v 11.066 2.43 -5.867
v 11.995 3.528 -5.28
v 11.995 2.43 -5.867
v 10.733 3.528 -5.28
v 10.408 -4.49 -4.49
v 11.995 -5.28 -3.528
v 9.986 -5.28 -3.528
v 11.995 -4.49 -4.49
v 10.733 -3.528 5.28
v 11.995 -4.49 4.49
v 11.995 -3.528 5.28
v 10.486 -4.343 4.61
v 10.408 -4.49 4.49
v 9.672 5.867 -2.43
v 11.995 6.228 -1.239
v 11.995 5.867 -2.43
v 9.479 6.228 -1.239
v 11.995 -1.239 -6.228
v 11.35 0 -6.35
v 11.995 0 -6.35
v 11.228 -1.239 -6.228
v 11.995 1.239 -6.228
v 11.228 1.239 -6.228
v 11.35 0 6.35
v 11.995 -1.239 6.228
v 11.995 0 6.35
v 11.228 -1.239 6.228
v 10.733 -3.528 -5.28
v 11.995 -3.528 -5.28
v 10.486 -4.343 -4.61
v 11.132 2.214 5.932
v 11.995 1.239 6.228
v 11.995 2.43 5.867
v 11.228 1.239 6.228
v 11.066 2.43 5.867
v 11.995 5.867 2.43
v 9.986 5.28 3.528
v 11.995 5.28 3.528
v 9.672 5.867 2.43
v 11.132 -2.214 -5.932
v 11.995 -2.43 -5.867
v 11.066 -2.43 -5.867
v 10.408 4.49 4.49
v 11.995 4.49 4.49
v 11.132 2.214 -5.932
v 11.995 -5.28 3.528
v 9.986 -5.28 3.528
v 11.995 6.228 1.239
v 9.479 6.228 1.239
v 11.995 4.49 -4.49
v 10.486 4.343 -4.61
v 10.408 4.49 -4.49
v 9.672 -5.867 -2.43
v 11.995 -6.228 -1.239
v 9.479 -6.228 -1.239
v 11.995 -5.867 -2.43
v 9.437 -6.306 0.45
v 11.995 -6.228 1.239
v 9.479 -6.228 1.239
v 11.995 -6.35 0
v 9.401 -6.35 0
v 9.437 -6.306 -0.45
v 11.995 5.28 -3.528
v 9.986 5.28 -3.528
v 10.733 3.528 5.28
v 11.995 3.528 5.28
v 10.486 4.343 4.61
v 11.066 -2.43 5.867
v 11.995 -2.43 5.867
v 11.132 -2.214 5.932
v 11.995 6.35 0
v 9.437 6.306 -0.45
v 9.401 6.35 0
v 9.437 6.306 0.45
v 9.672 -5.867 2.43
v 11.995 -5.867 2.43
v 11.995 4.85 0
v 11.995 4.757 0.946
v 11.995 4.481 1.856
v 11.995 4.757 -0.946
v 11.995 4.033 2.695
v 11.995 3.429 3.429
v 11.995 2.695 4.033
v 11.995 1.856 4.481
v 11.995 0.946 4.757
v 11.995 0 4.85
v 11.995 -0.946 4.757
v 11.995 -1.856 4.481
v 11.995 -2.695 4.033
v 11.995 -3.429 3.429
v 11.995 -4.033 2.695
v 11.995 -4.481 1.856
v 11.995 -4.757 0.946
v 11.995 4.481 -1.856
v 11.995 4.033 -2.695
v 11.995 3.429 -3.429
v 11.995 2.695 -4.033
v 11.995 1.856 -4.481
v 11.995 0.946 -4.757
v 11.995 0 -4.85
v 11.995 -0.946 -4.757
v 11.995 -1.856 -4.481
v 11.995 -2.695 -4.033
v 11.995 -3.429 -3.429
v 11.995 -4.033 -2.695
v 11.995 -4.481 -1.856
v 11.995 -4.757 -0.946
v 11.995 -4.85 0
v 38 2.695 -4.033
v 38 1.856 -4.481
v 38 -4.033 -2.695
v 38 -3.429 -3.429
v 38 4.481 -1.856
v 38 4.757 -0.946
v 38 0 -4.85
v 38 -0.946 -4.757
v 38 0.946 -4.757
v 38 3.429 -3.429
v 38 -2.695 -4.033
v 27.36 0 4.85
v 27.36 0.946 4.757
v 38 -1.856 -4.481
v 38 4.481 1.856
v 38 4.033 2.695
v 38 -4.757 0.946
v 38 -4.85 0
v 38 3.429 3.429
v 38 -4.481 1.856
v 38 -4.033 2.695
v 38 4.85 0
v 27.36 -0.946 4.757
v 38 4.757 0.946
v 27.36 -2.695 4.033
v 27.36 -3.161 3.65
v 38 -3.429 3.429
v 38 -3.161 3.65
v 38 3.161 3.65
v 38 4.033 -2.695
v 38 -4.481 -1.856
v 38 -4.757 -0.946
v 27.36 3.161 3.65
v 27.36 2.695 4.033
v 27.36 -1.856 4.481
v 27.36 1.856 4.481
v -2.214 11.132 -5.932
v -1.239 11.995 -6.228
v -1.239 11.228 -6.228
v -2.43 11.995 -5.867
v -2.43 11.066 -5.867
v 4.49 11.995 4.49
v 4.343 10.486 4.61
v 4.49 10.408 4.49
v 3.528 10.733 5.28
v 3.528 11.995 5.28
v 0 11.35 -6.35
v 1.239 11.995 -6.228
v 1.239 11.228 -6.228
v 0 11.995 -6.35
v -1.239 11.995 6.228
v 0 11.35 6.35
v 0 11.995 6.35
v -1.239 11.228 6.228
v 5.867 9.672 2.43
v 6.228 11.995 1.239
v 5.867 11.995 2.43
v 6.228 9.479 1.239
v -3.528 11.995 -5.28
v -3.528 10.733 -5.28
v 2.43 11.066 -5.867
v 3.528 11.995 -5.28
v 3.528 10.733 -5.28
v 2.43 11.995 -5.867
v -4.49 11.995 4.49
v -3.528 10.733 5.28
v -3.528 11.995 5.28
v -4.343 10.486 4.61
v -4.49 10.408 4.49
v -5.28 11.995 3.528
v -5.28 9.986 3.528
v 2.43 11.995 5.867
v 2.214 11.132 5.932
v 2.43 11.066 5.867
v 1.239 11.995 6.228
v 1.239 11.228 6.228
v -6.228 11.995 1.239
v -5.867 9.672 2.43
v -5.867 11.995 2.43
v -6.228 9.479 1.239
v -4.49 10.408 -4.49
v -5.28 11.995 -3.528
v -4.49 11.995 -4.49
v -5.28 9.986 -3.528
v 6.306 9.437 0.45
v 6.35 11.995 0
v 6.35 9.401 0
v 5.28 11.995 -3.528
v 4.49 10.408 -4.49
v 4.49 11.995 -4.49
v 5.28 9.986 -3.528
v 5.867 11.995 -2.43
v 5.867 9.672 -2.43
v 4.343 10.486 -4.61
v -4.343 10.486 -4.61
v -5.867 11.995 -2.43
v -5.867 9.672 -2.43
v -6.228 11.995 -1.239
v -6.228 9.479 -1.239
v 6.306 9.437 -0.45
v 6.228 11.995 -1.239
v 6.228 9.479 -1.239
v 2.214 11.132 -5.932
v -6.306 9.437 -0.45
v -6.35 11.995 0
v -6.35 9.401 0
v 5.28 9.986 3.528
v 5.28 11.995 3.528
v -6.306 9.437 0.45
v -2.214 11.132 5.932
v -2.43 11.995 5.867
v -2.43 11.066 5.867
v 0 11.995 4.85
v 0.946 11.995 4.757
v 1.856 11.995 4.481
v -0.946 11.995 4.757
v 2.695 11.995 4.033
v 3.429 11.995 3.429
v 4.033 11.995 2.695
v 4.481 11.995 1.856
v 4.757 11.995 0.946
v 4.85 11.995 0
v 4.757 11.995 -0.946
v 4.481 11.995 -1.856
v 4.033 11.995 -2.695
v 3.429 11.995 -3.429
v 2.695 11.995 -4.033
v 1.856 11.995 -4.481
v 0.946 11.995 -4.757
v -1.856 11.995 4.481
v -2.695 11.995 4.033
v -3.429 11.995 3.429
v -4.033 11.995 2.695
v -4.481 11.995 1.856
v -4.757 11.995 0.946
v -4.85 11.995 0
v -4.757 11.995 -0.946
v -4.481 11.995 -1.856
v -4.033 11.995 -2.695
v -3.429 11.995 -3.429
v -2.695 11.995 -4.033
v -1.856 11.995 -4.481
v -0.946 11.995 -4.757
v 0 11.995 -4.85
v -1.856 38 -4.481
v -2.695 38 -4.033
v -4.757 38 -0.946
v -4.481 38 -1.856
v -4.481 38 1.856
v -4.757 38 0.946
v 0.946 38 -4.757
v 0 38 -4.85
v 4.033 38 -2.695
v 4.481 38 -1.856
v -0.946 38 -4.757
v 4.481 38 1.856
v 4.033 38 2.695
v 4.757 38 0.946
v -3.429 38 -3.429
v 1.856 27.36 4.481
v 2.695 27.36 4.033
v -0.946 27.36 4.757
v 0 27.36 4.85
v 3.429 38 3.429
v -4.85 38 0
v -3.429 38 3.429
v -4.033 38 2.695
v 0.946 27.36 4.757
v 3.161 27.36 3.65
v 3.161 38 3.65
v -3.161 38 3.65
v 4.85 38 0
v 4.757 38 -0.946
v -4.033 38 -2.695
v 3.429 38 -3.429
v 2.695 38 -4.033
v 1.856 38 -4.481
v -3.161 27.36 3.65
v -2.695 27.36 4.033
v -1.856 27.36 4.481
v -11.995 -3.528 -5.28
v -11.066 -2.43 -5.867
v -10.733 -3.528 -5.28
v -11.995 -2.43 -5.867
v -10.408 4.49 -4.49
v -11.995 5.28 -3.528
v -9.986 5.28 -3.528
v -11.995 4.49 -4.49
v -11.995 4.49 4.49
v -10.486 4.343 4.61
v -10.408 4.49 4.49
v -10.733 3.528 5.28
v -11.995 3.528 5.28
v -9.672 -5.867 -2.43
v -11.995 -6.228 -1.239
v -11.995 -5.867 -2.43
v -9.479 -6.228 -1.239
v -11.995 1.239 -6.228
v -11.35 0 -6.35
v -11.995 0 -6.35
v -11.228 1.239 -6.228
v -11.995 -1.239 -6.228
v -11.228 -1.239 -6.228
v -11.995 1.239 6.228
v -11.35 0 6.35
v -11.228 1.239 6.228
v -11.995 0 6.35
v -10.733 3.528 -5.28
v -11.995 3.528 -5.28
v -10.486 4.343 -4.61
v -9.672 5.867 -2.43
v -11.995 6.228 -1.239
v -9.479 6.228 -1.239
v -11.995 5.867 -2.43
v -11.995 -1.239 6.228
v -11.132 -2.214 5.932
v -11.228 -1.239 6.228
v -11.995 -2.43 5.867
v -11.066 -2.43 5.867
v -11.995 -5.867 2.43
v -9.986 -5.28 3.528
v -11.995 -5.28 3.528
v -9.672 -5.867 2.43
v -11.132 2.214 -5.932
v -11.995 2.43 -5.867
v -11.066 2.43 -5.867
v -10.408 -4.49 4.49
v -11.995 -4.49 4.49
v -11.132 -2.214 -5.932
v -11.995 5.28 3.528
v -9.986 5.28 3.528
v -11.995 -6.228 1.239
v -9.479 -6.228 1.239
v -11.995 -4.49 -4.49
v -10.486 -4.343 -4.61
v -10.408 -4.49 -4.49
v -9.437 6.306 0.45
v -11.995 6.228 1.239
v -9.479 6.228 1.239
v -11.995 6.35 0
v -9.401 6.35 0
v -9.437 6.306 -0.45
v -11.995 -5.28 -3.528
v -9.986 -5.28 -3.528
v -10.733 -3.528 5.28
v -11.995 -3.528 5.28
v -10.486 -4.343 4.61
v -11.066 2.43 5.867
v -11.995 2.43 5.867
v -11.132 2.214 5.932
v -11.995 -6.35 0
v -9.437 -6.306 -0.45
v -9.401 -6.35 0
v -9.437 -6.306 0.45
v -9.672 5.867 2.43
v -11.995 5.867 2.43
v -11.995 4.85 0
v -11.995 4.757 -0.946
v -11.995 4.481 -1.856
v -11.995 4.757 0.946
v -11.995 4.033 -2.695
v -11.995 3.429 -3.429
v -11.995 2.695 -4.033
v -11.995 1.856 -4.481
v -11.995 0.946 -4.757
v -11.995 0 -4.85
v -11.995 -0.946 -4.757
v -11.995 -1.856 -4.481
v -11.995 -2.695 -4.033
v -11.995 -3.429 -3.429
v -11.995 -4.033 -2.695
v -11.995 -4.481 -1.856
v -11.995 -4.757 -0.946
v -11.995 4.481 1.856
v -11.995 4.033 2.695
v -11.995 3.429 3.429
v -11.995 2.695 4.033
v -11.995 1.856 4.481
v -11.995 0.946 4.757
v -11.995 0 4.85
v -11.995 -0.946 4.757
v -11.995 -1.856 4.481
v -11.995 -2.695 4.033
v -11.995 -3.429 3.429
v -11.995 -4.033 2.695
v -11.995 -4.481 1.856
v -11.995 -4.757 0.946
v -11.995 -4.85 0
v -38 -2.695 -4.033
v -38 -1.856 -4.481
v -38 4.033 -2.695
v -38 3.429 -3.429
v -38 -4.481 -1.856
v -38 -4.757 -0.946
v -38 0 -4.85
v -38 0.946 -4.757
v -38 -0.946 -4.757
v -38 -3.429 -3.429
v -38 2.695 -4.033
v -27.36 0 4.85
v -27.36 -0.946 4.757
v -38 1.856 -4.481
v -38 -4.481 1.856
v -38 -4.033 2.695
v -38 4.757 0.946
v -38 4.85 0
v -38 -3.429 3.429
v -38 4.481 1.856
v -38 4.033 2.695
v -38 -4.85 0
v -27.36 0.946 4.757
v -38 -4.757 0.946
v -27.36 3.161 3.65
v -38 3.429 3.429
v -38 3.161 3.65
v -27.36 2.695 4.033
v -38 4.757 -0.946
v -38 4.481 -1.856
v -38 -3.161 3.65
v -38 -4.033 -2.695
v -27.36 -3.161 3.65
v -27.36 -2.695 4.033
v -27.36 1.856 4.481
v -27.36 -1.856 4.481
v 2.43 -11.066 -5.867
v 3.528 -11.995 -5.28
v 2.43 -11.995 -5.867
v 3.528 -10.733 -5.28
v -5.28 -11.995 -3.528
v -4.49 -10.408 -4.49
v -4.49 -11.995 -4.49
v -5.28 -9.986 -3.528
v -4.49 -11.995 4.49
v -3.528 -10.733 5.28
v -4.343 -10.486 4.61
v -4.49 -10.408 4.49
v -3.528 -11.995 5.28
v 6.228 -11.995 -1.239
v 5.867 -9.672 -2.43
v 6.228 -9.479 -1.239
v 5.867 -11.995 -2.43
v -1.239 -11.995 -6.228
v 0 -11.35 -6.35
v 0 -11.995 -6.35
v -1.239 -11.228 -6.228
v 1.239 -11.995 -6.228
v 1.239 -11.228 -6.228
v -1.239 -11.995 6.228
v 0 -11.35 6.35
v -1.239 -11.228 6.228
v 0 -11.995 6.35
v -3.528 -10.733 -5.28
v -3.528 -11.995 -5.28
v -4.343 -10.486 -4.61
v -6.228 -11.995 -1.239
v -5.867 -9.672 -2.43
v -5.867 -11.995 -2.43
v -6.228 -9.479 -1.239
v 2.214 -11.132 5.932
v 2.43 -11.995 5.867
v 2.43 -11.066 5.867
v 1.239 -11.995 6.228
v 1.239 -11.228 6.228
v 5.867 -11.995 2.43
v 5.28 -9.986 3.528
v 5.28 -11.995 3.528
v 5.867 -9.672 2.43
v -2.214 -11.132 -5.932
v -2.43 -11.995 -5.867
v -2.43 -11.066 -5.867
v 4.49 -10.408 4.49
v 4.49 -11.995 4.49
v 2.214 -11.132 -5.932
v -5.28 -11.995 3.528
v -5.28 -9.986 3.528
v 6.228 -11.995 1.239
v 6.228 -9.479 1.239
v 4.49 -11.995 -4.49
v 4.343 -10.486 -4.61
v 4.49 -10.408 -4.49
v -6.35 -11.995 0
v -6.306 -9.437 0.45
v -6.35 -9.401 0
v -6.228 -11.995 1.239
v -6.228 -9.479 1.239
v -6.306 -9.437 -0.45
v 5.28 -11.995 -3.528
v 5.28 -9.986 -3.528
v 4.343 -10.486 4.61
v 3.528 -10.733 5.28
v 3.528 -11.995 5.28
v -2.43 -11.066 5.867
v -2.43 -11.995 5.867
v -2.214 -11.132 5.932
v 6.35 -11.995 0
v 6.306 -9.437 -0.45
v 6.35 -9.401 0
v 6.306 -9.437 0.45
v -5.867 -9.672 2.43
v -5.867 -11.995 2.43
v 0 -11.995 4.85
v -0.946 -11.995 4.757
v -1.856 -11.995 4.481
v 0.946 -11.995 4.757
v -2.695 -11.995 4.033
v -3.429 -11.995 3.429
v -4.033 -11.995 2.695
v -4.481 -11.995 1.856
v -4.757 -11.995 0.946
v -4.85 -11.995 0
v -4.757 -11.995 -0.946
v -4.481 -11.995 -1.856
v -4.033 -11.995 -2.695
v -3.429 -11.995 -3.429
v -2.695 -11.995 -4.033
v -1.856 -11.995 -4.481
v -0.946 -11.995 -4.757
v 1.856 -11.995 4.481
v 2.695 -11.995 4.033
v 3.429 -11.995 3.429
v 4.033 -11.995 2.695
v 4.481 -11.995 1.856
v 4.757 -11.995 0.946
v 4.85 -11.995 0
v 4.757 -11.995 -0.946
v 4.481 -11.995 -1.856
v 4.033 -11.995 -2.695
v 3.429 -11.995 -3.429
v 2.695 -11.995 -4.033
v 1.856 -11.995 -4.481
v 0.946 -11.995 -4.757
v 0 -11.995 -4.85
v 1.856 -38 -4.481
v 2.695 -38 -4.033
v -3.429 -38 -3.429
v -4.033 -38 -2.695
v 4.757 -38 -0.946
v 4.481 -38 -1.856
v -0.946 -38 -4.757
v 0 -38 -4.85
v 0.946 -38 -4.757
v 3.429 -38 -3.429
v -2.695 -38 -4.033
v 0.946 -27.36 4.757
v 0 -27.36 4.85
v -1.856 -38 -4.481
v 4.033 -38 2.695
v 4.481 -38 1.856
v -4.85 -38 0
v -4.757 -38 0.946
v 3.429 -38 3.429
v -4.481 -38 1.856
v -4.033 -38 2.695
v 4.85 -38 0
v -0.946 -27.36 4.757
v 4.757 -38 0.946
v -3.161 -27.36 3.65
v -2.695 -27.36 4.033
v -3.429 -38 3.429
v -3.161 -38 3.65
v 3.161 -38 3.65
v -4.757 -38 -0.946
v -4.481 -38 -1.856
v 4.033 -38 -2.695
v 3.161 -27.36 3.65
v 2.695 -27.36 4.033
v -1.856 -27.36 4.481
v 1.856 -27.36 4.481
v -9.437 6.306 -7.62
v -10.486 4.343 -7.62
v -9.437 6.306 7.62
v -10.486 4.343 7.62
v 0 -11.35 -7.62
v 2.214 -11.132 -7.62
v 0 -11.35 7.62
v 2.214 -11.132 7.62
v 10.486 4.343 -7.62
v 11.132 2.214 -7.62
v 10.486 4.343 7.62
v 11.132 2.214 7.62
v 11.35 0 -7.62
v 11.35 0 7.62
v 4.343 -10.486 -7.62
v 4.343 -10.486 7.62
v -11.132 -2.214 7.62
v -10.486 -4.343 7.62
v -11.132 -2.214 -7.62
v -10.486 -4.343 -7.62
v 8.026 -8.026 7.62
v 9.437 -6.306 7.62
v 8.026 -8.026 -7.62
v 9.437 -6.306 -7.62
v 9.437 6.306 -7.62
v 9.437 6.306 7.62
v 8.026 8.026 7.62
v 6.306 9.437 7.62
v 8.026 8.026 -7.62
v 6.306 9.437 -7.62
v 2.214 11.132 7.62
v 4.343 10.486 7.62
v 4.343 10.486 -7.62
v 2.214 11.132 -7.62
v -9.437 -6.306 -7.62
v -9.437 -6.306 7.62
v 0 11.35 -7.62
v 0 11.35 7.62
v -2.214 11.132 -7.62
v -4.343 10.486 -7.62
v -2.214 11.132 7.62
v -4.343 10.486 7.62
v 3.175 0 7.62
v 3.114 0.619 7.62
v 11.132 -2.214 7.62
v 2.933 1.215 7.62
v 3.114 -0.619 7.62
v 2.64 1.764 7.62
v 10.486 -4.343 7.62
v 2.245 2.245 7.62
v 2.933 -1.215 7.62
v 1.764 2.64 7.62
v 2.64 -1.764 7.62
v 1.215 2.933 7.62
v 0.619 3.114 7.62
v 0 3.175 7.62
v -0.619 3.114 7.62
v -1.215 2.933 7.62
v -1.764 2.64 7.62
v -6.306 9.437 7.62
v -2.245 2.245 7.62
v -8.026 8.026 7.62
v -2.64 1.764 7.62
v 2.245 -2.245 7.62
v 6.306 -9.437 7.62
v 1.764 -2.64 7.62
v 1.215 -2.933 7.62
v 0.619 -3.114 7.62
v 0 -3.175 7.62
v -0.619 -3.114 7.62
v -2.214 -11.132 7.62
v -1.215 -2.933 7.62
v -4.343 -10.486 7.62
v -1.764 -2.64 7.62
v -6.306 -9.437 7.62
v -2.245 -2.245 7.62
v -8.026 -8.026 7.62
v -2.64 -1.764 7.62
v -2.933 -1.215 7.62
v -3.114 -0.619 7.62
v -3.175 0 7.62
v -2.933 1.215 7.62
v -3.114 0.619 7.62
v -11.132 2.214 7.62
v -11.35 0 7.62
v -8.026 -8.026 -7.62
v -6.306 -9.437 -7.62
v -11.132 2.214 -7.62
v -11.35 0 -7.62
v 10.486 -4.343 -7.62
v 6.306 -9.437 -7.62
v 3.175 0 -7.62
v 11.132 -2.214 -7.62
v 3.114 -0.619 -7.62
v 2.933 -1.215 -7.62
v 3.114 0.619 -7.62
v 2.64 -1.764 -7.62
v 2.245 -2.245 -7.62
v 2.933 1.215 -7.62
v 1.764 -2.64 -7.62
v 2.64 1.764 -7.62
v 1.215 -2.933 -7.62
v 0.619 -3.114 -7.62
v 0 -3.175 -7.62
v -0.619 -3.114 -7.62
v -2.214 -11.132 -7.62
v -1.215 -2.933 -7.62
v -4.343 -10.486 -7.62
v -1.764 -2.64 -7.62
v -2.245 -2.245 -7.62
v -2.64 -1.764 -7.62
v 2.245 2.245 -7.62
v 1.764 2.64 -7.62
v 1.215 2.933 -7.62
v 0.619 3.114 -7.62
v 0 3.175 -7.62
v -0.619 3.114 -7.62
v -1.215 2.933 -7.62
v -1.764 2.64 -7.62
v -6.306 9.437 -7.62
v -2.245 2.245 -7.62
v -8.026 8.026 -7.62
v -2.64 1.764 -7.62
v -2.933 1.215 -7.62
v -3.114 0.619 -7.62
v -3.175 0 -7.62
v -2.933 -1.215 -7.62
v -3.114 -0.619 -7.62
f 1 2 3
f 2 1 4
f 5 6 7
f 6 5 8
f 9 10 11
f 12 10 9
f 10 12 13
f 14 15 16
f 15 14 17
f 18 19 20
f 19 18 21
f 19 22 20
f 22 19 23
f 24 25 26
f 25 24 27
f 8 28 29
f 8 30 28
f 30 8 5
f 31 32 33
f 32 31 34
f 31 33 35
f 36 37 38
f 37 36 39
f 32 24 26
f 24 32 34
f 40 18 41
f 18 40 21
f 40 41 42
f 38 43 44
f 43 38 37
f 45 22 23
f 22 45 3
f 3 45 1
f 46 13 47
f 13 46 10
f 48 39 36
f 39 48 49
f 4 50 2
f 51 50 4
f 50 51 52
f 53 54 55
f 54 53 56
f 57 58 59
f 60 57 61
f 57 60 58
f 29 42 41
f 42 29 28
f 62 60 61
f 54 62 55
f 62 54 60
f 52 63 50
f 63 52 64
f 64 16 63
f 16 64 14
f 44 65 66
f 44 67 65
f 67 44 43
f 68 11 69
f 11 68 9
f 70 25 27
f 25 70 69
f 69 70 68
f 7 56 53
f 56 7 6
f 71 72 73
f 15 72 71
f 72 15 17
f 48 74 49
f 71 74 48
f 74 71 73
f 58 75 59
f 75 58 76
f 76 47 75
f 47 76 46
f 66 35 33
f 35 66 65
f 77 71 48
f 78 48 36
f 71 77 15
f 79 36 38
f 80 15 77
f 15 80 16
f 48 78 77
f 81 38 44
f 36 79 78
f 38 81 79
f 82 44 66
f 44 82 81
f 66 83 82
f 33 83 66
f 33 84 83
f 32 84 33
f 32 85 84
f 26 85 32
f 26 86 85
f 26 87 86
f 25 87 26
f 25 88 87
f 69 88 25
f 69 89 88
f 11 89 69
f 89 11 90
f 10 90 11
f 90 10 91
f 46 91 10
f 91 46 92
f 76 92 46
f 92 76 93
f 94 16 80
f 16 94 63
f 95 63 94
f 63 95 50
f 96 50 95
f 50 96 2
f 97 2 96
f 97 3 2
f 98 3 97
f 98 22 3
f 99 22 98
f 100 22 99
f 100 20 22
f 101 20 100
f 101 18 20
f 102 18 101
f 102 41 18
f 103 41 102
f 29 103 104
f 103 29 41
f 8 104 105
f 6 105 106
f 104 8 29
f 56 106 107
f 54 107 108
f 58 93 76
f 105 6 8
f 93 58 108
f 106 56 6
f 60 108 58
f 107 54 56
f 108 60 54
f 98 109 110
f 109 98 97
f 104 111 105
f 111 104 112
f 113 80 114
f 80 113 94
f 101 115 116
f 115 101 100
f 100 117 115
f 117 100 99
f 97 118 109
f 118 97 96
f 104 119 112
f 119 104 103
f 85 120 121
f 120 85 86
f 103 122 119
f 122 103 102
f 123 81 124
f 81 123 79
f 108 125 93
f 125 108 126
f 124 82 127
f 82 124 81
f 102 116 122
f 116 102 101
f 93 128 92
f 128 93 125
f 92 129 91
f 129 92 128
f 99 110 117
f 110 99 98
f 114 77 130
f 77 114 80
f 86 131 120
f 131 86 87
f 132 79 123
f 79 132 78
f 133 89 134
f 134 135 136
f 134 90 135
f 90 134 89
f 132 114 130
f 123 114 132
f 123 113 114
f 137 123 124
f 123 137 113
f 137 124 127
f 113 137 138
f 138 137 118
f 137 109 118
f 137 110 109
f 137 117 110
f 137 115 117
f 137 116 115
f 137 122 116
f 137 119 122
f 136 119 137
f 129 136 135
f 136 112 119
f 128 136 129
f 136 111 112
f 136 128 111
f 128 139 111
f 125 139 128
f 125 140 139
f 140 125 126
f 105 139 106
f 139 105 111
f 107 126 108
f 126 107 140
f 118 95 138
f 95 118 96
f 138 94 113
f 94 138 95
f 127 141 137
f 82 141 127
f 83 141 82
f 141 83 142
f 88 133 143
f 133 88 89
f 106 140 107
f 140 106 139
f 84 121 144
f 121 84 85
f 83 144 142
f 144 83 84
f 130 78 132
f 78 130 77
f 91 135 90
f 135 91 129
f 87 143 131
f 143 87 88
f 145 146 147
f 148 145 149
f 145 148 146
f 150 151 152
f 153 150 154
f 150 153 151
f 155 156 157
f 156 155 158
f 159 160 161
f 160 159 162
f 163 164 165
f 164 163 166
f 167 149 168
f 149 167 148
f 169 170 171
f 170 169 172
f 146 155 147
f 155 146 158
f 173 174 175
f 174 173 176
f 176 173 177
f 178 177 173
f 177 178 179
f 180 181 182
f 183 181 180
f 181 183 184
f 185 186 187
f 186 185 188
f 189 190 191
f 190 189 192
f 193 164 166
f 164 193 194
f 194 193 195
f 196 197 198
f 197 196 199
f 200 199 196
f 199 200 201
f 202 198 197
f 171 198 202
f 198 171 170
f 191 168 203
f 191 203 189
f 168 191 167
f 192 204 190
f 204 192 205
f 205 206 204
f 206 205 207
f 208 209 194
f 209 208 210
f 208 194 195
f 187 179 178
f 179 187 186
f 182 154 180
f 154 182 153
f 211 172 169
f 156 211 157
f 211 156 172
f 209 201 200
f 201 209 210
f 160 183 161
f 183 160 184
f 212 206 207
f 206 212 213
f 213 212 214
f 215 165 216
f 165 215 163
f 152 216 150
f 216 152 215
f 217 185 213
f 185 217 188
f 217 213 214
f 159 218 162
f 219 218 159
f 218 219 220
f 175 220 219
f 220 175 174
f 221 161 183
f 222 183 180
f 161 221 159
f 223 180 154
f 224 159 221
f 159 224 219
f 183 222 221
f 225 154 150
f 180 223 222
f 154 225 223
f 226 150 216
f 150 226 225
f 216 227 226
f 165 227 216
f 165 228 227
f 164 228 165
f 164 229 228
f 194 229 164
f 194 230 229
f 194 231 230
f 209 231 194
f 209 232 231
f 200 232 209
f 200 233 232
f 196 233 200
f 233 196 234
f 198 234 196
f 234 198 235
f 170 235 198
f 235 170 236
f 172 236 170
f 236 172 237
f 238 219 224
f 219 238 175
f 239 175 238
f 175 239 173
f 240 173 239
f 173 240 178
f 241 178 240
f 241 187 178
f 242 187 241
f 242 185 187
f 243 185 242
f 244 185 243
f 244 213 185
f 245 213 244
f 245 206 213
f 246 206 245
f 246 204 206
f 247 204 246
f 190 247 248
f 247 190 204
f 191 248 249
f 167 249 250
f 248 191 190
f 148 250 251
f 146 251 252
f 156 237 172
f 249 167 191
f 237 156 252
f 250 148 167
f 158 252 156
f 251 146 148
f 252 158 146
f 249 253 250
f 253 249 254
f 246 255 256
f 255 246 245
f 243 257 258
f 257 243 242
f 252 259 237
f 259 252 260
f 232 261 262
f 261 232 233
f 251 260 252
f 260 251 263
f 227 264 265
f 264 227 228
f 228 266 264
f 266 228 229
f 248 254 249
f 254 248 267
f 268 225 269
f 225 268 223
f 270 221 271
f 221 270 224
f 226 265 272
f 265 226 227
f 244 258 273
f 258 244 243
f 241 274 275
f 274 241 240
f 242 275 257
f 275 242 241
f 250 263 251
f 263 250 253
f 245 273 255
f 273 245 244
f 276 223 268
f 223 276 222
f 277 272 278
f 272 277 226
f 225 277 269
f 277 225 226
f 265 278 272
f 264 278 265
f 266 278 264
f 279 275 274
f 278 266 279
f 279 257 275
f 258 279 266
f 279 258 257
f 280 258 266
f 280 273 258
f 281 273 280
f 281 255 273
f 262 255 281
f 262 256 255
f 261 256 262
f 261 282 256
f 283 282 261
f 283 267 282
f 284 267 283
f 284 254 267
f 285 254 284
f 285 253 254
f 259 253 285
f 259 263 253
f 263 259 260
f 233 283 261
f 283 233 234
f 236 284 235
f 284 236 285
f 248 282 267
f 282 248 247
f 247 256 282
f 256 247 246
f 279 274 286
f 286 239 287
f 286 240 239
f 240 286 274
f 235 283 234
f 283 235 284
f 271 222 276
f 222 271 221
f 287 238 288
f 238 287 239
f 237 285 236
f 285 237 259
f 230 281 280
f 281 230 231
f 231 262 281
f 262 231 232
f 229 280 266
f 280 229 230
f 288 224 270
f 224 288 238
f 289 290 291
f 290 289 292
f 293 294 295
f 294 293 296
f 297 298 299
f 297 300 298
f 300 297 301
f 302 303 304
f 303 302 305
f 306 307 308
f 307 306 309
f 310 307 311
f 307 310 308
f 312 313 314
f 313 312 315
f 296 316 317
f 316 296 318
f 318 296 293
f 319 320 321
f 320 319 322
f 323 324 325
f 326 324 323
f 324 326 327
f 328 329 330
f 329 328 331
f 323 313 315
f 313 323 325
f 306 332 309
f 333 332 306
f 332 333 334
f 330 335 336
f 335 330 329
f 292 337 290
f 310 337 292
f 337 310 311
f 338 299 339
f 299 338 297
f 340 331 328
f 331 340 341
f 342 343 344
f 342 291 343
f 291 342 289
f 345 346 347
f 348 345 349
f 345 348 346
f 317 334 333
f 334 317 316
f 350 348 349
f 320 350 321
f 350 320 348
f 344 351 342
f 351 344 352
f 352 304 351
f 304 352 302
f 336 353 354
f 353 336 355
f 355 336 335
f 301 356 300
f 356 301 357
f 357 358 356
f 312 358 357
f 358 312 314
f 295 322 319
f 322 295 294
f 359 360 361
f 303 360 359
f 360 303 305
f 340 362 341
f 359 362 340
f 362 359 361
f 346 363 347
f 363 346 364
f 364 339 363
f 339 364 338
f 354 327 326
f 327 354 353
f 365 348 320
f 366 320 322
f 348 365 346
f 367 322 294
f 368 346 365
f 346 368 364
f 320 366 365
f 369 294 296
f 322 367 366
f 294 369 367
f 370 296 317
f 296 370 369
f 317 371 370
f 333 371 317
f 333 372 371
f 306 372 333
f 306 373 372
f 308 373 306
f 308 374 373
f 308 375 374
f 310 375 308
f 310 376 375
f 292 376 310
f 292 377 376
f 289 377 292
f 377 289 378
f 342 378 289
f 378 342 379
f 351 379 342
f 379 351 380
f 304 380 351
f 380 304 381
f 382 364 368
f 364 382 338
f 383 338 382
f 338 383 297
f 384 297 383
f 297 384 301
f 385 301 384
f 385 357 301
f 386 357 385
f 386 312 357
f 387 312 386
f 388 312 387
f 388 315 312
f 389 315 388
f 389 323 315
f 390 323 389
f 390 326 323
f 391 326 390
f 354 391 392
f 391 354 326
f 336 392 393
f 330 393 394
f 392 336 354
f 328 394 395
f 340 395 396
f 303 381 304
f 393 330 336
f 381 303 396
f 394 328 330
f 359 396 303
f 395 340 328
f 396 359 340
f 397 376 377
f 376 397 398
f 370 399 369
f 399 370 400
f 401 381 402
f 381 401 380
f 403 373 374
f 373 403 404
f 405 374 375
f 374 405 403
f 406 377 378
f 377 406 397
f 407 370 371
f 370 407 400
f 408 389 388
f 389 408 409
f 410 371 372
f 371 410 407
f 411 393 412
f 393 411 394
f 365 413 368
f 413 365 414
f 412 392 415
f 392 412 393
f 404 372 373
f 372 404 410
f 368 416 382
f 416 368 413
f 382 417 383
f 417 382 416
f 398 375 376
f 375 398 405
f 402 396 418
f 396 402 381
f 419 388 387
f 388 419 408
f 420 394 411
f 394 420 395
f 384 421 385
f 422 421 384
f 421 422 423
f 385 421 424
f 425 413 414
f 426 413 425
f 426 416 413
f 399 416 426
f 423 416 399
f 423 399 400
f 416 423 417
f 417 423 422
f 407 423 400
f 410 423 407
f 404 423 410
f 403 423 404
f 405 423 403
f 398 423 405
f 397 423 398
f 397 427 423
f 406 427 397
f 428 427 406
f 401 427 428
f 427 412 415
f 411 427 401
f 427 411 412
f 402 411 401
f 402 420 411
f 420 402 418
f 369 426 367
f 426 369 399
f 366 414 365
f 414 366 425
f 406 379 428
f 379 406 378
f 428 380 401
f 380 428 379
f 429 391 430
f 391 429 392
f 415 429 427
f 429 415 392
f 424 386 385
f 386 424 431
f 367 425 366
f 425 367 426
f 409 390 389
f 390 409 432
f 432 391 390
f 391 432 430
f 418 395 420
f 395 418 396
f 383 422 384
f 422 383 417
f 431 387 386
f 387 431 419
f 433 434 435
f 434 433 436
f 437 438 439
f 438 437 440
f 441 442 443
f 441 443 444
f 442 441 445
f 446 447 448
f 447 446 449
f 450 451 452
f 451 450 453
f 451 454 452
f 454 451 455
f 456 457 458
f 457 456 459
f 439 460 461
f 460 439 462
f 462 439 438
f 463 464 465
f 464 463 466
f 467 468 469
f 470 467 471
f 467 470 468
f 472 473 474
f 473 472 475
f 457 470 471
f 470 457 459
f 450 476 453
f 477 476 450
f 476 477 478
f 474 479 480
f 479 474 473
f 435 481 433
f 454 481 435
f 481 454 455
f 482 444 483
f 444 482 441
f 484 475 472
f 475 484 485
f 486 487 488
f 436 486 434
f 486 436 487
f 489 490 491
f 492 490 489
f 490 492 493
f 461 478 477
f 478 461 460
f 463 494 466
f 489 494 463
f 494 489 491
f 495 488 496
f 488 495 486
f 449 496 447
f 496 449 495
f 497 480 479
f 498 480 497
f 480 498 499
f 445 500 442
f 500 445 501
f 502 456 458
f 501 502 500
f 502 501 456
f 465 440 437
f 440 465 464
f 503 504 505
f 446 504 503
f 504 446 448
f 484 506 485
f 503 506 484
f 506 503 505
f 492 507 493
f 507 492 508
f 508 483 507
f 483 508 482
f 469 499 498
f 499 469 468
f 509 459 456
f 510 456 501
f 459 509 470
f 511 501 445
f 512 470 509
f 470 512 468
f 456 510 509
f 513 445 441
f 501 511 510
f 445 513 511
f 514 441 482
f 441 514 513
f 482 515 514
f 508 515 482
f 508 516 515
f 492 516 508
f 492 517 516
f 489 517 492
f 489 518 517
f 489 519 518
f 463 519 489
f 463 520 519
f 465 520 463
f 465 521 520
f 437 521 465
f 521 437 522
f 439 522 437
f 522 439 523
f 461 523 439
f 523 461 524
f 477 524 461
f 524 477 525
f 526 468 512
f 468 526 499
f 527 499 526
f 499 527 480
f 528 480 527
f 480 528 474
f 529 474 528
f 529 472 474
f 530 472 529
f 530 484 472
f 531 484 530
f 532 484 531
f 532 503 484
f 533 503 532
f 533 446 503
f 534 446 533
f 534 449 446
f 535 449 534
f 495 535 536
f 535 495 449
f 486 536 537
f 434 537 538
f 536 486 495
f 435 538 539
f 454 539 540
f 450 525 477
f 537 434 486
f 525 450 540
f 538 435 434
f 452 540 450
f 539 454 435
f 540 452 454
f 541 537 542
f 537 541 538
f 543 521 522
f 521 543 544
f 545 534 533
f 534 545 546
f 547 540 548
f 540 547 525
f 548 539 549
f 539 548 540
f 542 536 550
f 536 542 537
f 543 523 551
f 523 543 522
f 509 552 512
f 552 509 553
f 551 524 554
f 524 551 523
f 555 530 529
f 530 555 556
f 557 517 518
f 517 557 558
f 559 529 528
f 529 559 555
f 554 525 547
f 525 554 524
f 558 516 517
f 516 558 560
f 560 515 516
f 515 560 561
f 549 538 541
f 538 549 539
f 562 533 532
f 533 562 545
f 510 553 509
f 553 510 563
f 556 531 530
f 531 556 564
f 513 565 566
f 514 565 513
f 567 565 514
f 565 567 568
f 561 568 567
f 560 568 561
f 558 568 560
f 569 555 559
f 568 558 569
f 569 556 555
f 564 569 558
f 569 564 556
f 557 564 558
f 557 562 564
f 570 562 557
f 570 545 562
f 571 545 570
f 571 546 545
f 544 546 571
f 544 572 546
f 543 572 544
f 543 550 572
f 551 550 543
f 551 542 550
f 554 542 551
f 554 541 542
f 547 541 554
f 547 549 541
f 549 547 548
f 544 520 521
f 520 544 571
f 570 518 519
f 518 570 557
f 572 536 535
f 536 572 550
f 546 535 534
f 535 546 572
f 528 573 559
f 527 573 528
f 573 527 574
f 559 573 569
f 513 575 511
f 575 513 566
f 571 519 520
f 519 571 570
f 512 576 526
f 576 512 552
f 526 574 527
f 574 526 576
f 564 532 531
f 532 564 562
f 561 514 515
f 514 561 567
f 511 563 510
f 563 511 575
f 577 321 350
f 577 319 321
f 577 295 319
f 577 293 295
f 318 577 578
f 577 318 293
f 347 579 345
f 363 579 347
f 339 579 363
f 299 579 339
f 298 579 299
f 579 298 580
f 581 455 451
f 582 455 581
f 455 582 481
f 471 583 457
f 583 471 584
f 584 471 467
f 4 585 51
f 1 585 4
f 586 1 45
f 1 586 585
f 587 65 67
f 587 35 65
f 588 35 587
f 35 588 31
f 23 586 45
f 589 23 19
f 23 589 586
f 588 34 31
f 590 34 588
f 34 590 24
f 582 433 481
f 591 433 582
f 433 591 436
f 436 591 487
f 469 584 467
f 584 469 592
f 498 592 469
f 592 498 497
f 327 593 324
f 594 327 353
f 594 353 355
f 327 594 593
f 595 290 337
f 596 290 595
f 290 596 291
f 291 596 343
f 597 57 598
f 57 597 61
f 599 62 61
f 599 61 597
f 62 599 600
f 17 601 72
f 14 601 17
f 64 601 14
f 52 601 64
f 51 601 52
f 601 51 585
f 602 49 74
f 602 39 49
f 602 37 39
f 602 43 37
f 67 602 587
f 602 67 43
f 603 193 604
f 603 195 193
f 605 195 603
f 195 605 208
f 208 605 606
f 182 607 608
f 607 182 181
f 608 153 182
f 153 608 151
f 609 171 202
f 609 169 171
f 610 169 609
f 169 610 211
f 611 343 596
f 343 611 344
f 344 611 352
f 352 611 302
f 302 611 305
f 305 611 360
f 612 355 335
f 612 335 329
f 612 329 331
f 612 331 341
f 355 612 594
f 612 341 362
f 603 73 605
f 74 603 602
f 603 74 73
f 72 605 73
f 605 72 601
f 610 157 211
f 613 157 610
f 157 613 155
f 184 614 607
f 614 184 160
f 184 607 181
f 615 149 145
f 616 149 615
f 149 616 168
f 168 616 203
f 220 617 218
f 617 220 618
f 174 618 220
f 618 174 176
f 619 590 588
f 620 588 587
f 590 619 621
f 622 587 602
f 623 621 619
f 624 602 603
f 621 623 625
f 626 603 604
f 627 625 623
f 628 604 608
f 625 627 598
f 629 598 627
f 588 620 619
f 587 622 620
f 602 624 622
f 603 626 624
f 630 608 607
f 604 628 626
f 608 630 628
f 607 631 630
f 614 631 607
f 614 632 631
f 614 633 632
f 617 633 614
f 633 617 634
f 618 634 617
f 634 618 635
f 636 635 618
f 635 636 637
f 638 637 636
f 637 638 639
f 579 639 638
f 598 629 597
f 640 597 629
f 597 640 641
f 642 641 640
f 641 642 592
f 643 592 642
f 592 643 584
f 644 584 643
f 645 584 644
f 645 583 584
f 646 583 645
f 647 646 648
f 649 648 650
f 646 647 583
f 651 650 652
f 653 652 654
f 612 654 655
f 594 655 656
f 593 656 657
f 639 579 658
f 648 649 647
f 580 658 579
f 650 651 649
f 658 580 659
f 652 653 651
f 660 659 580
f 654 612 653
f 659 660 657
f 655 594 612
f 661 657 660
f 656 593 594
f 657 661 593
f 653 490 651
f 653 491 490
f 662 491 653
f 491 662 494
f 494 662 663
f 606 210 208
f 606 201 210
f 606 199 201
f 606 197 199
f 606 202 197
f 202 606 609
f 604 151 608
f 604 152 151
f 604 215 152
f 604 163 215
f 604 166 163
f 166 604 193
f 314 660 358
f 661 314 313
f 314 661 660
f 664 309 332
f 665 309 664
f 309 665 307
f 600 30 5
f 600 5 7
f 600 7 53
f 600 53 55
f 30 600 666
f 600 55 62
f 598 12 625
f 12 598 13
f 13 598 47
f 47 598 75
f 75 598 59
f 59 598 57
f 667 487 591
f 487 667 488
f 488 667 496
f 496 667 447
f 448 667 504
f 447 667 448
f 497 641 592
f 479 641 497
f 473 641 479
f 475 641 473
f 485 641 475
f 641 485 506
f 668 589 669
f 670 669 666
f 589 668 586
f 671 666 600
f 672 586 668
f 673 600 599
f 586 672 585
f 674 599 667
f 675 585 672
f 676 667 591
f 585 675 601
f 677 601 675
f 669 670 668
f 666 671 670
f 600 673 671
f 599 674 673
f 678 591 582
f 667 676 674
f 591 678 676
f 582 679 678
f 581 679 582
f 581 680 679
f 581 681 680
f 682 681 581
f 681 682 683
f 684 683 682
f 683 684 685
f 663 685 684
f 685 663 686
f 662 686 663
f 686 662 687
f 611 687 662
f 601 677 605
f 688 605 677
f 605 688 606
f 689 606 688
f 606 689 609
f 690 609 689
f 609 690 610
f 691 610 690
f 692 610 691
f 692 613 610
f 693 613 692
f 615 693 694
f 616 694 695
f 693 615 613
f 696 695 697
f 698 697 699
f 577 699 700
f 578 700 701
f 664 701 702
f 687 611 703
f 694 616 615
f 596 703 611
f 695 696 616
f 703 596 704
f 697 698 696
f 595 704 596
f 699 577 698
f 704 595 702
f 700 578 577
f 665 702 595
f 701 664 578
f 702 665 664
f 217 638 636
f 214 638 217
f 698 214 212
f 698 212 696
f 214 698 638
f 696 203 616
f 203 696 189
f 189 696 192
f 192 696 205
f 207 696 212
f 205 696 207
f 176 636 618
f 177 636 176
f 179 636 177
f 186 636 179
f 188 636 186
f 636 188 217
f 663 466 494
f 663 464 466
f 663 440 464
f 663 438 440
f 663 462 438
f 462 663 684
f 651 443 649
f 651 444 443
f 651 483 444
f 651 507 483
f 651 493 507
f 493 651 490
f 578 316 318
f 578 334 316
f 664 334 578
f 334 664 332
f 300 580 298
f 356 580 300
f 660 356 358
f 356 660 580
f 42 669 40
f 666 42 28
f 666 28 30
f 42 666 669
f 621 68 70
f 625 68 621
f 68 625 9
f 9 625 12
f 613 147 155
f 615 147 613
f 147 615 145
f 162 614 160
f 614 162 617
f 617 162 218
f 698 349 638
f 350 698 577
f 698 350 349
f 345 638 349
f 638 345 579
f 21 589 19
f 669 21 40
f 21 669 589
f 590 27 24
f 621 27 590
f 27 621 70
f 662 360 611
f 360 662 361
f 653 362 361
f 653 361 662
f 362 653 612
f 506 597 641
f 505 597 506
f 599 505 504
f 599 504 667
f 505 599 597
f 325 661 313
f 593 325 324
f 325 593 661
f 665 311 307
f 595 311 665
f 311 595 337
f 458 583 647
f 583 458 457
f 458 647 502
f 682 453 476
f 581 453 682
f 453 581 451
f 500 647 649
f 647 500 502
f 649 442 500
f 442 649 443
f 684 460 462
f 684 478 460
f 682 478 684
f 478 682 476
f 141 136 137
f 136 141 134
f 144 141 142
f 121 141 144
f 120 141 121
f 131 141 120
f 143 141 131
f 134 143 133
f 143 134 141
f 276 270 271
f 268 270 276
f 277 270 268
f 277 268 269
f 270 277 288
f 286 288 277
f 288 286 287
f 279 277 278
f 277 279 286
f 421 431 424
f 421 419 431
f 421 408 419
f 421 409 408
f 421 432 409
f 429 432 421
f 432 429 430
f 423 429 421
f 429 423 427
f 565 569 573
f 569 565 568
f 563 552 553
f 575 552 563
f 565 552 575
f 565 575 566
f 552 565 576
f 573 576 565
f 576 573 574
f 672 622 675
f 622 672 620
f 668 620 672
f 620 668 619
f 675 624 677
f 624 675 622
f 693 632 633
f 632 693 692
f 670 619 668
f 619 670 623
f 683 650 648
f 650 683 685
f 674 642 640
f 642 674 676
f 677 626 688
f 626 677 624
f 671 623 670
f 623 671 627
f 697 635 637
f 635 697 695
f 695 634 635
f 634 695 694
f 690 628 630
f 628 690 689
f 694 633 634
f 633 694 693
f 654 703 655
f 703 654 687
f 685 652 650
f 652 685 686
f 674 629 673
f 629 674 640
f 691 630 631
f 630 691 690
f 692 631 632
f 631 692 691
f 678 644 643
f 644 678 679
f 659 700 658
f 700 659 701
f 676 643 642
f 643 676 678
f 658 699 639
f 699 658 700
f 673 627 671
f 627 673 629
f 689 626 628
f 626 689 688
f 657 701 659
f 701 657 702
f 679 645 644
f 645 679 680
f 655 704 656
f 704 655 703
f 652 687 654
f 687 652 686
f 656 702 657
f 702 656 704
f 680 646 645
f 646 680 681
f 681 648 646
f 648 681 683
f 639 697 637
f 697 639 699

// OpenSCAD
$fn = 32;

// ----------------------------------------------------------------------
// Cardan cross: 76 mm span, 12.7 mm trunnions
// ----------------------------------------------------------------------

// --- parameters (mm) ---
journal_d = 12.7;         // trunnion diameter
arm_len = 38;             // trunnion length from the centre
step_r = 4.32;            // step position from the centre
step_d = 9.7;             // journal diameter after the step
hub_d = 22.7;             // hub diameter
hub_h = 15.24;            // hub height
bore_d = 6.35;            // hub bore
flat_d = 1.2;             // depth of the journal flat
flat_len = 10.64;         // length of the journal flat

difference() {
  union() {
    /* hub along the joint axis */
    cylinder(h = hub_h, d = hub_d, center = true);
    for (a = [0 : 90 : 270]) rotate([0, 0, a]) {
      /* trunnion, sunk into the hub */
      translate([hub_d / 4, 0, 0]) rotate([0, 90, 0]) cylinder(h = step_r + 2, d = journal_d);
      /* stepped journal out to the tip */
      translate([step_r - 0.5, 0, 0]) rotate([0, 90, 0]) cylinder(h = arm_len + 0.5 - step_r, d = step_d);
    }
  }
  /* lubrication bore through the hub, 2.5 mm clear on both sides */
  translate([0, 0, -hub_h / 2 - 2.5]) cylinder(h = hub_h + 5, d = bore_d);
  /* machined flat on each journal tip */
  for (a = [0 : 90 : 270]) rotate([0, 0, a]) {
    translate([arm_len - flat_len, -step_d, step_d / 2 - flat_d]) cube([flat_len + 0.5, 2 * step_d, flat_d + 2.5]);
  }
}
